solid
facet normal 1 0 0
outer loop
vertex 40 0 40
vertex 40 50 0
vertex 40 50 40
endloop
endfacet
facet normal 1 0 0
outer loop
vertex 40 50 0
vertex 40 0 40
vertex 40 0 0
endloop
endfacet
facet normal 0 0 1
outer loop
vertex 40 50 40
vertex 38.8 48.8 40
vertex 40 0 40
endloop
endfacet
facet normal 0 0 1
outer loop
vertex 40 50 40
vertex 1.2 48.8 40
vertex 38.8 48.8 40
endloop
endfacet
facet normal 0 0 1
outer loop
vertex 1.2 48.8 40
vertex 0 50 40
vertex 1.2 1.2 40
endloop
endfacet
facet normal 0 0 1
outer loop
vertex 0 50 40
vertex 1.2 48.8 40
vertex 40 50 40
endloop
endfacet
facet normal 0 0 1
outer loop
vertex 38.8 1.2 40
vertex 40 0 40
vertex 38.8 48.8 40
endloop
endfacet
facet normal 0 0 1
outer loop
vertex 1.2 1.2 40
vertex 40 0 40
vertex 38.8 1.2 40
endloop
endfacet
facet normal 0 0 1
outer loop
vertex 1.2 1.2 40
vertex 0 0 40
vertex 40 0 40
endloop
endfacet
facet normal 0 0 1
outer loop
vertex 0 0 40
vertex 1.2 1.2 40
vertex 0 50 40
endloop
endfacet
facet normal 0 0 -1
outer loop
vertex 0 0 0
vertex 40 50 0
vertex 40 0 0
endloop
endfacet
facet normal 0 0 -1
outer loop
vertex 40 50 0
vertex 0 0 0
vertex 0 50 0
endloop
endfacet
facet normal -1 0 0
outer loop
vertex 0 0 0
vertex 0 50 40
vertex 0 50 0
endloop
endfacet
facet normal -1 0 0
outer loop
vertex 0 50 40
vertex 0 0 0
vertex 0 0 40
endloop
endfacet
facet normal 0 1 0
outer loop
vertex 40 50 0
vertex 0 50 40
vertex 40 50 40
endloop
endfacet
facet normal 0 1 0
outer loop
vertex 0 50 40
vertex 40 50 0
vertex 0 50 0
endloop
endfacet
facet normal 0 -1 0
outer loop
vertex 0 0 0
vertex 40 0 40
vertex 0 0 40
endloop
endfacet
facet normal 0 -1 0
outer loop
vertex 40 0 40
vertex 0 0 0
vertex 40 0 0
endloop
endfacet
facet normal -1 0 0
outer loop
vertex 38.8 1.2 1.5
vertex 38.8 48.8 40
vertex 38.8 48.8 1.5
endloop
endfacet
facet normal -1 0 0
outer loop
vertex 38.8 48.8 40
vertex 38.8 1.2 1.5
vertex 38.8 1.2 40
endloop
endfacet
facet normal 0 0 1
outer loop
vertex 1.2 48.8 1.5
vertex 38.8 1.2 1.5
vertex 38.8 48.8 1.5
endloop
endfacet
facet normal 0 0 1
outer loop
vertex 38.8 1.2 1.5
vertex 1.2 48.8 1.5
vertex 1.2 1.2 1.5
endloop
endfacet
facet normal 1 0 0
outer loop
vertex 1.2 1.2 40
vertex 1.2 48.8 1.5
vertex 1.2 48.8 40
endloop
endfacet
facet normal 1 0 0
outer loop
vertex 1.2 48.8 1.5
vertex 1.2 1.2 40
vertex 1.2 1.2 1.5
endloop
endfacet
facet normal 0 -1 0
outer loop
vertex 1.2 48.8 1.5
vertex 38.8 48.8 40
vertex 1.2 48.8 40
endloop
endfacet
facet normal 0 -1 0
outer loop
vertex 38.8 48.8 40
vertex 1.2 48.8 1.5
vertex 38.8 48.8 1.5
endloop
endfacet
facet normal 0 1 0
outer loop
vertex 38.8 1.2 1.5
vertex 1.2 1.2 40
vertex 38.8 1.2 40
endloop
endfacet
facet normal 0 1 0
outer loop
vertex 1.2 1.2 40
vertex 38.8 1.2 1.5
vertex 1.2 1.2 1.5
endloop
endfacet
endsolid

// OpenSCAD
$fn = 32;

// ----------------------------------------------------------------------
// Open box: 1.2 mm walls
// ----------------------------------------------------------------------

// --- parameters (mm) ---
box_l = 40;               // outer length, X
box_w = 50;               // outer width, Y
box_h = 40;               // outer height, Z
wall = 1.2;               // wall thickness
floor = 1.5;              // floor thickness

difference() {
  cube([box_l, box_w, box_h]);
  translate([wall, wall, floor])
    cube([box_l - 2 * wall, box_w - 2 * wall, box_h]);
}
